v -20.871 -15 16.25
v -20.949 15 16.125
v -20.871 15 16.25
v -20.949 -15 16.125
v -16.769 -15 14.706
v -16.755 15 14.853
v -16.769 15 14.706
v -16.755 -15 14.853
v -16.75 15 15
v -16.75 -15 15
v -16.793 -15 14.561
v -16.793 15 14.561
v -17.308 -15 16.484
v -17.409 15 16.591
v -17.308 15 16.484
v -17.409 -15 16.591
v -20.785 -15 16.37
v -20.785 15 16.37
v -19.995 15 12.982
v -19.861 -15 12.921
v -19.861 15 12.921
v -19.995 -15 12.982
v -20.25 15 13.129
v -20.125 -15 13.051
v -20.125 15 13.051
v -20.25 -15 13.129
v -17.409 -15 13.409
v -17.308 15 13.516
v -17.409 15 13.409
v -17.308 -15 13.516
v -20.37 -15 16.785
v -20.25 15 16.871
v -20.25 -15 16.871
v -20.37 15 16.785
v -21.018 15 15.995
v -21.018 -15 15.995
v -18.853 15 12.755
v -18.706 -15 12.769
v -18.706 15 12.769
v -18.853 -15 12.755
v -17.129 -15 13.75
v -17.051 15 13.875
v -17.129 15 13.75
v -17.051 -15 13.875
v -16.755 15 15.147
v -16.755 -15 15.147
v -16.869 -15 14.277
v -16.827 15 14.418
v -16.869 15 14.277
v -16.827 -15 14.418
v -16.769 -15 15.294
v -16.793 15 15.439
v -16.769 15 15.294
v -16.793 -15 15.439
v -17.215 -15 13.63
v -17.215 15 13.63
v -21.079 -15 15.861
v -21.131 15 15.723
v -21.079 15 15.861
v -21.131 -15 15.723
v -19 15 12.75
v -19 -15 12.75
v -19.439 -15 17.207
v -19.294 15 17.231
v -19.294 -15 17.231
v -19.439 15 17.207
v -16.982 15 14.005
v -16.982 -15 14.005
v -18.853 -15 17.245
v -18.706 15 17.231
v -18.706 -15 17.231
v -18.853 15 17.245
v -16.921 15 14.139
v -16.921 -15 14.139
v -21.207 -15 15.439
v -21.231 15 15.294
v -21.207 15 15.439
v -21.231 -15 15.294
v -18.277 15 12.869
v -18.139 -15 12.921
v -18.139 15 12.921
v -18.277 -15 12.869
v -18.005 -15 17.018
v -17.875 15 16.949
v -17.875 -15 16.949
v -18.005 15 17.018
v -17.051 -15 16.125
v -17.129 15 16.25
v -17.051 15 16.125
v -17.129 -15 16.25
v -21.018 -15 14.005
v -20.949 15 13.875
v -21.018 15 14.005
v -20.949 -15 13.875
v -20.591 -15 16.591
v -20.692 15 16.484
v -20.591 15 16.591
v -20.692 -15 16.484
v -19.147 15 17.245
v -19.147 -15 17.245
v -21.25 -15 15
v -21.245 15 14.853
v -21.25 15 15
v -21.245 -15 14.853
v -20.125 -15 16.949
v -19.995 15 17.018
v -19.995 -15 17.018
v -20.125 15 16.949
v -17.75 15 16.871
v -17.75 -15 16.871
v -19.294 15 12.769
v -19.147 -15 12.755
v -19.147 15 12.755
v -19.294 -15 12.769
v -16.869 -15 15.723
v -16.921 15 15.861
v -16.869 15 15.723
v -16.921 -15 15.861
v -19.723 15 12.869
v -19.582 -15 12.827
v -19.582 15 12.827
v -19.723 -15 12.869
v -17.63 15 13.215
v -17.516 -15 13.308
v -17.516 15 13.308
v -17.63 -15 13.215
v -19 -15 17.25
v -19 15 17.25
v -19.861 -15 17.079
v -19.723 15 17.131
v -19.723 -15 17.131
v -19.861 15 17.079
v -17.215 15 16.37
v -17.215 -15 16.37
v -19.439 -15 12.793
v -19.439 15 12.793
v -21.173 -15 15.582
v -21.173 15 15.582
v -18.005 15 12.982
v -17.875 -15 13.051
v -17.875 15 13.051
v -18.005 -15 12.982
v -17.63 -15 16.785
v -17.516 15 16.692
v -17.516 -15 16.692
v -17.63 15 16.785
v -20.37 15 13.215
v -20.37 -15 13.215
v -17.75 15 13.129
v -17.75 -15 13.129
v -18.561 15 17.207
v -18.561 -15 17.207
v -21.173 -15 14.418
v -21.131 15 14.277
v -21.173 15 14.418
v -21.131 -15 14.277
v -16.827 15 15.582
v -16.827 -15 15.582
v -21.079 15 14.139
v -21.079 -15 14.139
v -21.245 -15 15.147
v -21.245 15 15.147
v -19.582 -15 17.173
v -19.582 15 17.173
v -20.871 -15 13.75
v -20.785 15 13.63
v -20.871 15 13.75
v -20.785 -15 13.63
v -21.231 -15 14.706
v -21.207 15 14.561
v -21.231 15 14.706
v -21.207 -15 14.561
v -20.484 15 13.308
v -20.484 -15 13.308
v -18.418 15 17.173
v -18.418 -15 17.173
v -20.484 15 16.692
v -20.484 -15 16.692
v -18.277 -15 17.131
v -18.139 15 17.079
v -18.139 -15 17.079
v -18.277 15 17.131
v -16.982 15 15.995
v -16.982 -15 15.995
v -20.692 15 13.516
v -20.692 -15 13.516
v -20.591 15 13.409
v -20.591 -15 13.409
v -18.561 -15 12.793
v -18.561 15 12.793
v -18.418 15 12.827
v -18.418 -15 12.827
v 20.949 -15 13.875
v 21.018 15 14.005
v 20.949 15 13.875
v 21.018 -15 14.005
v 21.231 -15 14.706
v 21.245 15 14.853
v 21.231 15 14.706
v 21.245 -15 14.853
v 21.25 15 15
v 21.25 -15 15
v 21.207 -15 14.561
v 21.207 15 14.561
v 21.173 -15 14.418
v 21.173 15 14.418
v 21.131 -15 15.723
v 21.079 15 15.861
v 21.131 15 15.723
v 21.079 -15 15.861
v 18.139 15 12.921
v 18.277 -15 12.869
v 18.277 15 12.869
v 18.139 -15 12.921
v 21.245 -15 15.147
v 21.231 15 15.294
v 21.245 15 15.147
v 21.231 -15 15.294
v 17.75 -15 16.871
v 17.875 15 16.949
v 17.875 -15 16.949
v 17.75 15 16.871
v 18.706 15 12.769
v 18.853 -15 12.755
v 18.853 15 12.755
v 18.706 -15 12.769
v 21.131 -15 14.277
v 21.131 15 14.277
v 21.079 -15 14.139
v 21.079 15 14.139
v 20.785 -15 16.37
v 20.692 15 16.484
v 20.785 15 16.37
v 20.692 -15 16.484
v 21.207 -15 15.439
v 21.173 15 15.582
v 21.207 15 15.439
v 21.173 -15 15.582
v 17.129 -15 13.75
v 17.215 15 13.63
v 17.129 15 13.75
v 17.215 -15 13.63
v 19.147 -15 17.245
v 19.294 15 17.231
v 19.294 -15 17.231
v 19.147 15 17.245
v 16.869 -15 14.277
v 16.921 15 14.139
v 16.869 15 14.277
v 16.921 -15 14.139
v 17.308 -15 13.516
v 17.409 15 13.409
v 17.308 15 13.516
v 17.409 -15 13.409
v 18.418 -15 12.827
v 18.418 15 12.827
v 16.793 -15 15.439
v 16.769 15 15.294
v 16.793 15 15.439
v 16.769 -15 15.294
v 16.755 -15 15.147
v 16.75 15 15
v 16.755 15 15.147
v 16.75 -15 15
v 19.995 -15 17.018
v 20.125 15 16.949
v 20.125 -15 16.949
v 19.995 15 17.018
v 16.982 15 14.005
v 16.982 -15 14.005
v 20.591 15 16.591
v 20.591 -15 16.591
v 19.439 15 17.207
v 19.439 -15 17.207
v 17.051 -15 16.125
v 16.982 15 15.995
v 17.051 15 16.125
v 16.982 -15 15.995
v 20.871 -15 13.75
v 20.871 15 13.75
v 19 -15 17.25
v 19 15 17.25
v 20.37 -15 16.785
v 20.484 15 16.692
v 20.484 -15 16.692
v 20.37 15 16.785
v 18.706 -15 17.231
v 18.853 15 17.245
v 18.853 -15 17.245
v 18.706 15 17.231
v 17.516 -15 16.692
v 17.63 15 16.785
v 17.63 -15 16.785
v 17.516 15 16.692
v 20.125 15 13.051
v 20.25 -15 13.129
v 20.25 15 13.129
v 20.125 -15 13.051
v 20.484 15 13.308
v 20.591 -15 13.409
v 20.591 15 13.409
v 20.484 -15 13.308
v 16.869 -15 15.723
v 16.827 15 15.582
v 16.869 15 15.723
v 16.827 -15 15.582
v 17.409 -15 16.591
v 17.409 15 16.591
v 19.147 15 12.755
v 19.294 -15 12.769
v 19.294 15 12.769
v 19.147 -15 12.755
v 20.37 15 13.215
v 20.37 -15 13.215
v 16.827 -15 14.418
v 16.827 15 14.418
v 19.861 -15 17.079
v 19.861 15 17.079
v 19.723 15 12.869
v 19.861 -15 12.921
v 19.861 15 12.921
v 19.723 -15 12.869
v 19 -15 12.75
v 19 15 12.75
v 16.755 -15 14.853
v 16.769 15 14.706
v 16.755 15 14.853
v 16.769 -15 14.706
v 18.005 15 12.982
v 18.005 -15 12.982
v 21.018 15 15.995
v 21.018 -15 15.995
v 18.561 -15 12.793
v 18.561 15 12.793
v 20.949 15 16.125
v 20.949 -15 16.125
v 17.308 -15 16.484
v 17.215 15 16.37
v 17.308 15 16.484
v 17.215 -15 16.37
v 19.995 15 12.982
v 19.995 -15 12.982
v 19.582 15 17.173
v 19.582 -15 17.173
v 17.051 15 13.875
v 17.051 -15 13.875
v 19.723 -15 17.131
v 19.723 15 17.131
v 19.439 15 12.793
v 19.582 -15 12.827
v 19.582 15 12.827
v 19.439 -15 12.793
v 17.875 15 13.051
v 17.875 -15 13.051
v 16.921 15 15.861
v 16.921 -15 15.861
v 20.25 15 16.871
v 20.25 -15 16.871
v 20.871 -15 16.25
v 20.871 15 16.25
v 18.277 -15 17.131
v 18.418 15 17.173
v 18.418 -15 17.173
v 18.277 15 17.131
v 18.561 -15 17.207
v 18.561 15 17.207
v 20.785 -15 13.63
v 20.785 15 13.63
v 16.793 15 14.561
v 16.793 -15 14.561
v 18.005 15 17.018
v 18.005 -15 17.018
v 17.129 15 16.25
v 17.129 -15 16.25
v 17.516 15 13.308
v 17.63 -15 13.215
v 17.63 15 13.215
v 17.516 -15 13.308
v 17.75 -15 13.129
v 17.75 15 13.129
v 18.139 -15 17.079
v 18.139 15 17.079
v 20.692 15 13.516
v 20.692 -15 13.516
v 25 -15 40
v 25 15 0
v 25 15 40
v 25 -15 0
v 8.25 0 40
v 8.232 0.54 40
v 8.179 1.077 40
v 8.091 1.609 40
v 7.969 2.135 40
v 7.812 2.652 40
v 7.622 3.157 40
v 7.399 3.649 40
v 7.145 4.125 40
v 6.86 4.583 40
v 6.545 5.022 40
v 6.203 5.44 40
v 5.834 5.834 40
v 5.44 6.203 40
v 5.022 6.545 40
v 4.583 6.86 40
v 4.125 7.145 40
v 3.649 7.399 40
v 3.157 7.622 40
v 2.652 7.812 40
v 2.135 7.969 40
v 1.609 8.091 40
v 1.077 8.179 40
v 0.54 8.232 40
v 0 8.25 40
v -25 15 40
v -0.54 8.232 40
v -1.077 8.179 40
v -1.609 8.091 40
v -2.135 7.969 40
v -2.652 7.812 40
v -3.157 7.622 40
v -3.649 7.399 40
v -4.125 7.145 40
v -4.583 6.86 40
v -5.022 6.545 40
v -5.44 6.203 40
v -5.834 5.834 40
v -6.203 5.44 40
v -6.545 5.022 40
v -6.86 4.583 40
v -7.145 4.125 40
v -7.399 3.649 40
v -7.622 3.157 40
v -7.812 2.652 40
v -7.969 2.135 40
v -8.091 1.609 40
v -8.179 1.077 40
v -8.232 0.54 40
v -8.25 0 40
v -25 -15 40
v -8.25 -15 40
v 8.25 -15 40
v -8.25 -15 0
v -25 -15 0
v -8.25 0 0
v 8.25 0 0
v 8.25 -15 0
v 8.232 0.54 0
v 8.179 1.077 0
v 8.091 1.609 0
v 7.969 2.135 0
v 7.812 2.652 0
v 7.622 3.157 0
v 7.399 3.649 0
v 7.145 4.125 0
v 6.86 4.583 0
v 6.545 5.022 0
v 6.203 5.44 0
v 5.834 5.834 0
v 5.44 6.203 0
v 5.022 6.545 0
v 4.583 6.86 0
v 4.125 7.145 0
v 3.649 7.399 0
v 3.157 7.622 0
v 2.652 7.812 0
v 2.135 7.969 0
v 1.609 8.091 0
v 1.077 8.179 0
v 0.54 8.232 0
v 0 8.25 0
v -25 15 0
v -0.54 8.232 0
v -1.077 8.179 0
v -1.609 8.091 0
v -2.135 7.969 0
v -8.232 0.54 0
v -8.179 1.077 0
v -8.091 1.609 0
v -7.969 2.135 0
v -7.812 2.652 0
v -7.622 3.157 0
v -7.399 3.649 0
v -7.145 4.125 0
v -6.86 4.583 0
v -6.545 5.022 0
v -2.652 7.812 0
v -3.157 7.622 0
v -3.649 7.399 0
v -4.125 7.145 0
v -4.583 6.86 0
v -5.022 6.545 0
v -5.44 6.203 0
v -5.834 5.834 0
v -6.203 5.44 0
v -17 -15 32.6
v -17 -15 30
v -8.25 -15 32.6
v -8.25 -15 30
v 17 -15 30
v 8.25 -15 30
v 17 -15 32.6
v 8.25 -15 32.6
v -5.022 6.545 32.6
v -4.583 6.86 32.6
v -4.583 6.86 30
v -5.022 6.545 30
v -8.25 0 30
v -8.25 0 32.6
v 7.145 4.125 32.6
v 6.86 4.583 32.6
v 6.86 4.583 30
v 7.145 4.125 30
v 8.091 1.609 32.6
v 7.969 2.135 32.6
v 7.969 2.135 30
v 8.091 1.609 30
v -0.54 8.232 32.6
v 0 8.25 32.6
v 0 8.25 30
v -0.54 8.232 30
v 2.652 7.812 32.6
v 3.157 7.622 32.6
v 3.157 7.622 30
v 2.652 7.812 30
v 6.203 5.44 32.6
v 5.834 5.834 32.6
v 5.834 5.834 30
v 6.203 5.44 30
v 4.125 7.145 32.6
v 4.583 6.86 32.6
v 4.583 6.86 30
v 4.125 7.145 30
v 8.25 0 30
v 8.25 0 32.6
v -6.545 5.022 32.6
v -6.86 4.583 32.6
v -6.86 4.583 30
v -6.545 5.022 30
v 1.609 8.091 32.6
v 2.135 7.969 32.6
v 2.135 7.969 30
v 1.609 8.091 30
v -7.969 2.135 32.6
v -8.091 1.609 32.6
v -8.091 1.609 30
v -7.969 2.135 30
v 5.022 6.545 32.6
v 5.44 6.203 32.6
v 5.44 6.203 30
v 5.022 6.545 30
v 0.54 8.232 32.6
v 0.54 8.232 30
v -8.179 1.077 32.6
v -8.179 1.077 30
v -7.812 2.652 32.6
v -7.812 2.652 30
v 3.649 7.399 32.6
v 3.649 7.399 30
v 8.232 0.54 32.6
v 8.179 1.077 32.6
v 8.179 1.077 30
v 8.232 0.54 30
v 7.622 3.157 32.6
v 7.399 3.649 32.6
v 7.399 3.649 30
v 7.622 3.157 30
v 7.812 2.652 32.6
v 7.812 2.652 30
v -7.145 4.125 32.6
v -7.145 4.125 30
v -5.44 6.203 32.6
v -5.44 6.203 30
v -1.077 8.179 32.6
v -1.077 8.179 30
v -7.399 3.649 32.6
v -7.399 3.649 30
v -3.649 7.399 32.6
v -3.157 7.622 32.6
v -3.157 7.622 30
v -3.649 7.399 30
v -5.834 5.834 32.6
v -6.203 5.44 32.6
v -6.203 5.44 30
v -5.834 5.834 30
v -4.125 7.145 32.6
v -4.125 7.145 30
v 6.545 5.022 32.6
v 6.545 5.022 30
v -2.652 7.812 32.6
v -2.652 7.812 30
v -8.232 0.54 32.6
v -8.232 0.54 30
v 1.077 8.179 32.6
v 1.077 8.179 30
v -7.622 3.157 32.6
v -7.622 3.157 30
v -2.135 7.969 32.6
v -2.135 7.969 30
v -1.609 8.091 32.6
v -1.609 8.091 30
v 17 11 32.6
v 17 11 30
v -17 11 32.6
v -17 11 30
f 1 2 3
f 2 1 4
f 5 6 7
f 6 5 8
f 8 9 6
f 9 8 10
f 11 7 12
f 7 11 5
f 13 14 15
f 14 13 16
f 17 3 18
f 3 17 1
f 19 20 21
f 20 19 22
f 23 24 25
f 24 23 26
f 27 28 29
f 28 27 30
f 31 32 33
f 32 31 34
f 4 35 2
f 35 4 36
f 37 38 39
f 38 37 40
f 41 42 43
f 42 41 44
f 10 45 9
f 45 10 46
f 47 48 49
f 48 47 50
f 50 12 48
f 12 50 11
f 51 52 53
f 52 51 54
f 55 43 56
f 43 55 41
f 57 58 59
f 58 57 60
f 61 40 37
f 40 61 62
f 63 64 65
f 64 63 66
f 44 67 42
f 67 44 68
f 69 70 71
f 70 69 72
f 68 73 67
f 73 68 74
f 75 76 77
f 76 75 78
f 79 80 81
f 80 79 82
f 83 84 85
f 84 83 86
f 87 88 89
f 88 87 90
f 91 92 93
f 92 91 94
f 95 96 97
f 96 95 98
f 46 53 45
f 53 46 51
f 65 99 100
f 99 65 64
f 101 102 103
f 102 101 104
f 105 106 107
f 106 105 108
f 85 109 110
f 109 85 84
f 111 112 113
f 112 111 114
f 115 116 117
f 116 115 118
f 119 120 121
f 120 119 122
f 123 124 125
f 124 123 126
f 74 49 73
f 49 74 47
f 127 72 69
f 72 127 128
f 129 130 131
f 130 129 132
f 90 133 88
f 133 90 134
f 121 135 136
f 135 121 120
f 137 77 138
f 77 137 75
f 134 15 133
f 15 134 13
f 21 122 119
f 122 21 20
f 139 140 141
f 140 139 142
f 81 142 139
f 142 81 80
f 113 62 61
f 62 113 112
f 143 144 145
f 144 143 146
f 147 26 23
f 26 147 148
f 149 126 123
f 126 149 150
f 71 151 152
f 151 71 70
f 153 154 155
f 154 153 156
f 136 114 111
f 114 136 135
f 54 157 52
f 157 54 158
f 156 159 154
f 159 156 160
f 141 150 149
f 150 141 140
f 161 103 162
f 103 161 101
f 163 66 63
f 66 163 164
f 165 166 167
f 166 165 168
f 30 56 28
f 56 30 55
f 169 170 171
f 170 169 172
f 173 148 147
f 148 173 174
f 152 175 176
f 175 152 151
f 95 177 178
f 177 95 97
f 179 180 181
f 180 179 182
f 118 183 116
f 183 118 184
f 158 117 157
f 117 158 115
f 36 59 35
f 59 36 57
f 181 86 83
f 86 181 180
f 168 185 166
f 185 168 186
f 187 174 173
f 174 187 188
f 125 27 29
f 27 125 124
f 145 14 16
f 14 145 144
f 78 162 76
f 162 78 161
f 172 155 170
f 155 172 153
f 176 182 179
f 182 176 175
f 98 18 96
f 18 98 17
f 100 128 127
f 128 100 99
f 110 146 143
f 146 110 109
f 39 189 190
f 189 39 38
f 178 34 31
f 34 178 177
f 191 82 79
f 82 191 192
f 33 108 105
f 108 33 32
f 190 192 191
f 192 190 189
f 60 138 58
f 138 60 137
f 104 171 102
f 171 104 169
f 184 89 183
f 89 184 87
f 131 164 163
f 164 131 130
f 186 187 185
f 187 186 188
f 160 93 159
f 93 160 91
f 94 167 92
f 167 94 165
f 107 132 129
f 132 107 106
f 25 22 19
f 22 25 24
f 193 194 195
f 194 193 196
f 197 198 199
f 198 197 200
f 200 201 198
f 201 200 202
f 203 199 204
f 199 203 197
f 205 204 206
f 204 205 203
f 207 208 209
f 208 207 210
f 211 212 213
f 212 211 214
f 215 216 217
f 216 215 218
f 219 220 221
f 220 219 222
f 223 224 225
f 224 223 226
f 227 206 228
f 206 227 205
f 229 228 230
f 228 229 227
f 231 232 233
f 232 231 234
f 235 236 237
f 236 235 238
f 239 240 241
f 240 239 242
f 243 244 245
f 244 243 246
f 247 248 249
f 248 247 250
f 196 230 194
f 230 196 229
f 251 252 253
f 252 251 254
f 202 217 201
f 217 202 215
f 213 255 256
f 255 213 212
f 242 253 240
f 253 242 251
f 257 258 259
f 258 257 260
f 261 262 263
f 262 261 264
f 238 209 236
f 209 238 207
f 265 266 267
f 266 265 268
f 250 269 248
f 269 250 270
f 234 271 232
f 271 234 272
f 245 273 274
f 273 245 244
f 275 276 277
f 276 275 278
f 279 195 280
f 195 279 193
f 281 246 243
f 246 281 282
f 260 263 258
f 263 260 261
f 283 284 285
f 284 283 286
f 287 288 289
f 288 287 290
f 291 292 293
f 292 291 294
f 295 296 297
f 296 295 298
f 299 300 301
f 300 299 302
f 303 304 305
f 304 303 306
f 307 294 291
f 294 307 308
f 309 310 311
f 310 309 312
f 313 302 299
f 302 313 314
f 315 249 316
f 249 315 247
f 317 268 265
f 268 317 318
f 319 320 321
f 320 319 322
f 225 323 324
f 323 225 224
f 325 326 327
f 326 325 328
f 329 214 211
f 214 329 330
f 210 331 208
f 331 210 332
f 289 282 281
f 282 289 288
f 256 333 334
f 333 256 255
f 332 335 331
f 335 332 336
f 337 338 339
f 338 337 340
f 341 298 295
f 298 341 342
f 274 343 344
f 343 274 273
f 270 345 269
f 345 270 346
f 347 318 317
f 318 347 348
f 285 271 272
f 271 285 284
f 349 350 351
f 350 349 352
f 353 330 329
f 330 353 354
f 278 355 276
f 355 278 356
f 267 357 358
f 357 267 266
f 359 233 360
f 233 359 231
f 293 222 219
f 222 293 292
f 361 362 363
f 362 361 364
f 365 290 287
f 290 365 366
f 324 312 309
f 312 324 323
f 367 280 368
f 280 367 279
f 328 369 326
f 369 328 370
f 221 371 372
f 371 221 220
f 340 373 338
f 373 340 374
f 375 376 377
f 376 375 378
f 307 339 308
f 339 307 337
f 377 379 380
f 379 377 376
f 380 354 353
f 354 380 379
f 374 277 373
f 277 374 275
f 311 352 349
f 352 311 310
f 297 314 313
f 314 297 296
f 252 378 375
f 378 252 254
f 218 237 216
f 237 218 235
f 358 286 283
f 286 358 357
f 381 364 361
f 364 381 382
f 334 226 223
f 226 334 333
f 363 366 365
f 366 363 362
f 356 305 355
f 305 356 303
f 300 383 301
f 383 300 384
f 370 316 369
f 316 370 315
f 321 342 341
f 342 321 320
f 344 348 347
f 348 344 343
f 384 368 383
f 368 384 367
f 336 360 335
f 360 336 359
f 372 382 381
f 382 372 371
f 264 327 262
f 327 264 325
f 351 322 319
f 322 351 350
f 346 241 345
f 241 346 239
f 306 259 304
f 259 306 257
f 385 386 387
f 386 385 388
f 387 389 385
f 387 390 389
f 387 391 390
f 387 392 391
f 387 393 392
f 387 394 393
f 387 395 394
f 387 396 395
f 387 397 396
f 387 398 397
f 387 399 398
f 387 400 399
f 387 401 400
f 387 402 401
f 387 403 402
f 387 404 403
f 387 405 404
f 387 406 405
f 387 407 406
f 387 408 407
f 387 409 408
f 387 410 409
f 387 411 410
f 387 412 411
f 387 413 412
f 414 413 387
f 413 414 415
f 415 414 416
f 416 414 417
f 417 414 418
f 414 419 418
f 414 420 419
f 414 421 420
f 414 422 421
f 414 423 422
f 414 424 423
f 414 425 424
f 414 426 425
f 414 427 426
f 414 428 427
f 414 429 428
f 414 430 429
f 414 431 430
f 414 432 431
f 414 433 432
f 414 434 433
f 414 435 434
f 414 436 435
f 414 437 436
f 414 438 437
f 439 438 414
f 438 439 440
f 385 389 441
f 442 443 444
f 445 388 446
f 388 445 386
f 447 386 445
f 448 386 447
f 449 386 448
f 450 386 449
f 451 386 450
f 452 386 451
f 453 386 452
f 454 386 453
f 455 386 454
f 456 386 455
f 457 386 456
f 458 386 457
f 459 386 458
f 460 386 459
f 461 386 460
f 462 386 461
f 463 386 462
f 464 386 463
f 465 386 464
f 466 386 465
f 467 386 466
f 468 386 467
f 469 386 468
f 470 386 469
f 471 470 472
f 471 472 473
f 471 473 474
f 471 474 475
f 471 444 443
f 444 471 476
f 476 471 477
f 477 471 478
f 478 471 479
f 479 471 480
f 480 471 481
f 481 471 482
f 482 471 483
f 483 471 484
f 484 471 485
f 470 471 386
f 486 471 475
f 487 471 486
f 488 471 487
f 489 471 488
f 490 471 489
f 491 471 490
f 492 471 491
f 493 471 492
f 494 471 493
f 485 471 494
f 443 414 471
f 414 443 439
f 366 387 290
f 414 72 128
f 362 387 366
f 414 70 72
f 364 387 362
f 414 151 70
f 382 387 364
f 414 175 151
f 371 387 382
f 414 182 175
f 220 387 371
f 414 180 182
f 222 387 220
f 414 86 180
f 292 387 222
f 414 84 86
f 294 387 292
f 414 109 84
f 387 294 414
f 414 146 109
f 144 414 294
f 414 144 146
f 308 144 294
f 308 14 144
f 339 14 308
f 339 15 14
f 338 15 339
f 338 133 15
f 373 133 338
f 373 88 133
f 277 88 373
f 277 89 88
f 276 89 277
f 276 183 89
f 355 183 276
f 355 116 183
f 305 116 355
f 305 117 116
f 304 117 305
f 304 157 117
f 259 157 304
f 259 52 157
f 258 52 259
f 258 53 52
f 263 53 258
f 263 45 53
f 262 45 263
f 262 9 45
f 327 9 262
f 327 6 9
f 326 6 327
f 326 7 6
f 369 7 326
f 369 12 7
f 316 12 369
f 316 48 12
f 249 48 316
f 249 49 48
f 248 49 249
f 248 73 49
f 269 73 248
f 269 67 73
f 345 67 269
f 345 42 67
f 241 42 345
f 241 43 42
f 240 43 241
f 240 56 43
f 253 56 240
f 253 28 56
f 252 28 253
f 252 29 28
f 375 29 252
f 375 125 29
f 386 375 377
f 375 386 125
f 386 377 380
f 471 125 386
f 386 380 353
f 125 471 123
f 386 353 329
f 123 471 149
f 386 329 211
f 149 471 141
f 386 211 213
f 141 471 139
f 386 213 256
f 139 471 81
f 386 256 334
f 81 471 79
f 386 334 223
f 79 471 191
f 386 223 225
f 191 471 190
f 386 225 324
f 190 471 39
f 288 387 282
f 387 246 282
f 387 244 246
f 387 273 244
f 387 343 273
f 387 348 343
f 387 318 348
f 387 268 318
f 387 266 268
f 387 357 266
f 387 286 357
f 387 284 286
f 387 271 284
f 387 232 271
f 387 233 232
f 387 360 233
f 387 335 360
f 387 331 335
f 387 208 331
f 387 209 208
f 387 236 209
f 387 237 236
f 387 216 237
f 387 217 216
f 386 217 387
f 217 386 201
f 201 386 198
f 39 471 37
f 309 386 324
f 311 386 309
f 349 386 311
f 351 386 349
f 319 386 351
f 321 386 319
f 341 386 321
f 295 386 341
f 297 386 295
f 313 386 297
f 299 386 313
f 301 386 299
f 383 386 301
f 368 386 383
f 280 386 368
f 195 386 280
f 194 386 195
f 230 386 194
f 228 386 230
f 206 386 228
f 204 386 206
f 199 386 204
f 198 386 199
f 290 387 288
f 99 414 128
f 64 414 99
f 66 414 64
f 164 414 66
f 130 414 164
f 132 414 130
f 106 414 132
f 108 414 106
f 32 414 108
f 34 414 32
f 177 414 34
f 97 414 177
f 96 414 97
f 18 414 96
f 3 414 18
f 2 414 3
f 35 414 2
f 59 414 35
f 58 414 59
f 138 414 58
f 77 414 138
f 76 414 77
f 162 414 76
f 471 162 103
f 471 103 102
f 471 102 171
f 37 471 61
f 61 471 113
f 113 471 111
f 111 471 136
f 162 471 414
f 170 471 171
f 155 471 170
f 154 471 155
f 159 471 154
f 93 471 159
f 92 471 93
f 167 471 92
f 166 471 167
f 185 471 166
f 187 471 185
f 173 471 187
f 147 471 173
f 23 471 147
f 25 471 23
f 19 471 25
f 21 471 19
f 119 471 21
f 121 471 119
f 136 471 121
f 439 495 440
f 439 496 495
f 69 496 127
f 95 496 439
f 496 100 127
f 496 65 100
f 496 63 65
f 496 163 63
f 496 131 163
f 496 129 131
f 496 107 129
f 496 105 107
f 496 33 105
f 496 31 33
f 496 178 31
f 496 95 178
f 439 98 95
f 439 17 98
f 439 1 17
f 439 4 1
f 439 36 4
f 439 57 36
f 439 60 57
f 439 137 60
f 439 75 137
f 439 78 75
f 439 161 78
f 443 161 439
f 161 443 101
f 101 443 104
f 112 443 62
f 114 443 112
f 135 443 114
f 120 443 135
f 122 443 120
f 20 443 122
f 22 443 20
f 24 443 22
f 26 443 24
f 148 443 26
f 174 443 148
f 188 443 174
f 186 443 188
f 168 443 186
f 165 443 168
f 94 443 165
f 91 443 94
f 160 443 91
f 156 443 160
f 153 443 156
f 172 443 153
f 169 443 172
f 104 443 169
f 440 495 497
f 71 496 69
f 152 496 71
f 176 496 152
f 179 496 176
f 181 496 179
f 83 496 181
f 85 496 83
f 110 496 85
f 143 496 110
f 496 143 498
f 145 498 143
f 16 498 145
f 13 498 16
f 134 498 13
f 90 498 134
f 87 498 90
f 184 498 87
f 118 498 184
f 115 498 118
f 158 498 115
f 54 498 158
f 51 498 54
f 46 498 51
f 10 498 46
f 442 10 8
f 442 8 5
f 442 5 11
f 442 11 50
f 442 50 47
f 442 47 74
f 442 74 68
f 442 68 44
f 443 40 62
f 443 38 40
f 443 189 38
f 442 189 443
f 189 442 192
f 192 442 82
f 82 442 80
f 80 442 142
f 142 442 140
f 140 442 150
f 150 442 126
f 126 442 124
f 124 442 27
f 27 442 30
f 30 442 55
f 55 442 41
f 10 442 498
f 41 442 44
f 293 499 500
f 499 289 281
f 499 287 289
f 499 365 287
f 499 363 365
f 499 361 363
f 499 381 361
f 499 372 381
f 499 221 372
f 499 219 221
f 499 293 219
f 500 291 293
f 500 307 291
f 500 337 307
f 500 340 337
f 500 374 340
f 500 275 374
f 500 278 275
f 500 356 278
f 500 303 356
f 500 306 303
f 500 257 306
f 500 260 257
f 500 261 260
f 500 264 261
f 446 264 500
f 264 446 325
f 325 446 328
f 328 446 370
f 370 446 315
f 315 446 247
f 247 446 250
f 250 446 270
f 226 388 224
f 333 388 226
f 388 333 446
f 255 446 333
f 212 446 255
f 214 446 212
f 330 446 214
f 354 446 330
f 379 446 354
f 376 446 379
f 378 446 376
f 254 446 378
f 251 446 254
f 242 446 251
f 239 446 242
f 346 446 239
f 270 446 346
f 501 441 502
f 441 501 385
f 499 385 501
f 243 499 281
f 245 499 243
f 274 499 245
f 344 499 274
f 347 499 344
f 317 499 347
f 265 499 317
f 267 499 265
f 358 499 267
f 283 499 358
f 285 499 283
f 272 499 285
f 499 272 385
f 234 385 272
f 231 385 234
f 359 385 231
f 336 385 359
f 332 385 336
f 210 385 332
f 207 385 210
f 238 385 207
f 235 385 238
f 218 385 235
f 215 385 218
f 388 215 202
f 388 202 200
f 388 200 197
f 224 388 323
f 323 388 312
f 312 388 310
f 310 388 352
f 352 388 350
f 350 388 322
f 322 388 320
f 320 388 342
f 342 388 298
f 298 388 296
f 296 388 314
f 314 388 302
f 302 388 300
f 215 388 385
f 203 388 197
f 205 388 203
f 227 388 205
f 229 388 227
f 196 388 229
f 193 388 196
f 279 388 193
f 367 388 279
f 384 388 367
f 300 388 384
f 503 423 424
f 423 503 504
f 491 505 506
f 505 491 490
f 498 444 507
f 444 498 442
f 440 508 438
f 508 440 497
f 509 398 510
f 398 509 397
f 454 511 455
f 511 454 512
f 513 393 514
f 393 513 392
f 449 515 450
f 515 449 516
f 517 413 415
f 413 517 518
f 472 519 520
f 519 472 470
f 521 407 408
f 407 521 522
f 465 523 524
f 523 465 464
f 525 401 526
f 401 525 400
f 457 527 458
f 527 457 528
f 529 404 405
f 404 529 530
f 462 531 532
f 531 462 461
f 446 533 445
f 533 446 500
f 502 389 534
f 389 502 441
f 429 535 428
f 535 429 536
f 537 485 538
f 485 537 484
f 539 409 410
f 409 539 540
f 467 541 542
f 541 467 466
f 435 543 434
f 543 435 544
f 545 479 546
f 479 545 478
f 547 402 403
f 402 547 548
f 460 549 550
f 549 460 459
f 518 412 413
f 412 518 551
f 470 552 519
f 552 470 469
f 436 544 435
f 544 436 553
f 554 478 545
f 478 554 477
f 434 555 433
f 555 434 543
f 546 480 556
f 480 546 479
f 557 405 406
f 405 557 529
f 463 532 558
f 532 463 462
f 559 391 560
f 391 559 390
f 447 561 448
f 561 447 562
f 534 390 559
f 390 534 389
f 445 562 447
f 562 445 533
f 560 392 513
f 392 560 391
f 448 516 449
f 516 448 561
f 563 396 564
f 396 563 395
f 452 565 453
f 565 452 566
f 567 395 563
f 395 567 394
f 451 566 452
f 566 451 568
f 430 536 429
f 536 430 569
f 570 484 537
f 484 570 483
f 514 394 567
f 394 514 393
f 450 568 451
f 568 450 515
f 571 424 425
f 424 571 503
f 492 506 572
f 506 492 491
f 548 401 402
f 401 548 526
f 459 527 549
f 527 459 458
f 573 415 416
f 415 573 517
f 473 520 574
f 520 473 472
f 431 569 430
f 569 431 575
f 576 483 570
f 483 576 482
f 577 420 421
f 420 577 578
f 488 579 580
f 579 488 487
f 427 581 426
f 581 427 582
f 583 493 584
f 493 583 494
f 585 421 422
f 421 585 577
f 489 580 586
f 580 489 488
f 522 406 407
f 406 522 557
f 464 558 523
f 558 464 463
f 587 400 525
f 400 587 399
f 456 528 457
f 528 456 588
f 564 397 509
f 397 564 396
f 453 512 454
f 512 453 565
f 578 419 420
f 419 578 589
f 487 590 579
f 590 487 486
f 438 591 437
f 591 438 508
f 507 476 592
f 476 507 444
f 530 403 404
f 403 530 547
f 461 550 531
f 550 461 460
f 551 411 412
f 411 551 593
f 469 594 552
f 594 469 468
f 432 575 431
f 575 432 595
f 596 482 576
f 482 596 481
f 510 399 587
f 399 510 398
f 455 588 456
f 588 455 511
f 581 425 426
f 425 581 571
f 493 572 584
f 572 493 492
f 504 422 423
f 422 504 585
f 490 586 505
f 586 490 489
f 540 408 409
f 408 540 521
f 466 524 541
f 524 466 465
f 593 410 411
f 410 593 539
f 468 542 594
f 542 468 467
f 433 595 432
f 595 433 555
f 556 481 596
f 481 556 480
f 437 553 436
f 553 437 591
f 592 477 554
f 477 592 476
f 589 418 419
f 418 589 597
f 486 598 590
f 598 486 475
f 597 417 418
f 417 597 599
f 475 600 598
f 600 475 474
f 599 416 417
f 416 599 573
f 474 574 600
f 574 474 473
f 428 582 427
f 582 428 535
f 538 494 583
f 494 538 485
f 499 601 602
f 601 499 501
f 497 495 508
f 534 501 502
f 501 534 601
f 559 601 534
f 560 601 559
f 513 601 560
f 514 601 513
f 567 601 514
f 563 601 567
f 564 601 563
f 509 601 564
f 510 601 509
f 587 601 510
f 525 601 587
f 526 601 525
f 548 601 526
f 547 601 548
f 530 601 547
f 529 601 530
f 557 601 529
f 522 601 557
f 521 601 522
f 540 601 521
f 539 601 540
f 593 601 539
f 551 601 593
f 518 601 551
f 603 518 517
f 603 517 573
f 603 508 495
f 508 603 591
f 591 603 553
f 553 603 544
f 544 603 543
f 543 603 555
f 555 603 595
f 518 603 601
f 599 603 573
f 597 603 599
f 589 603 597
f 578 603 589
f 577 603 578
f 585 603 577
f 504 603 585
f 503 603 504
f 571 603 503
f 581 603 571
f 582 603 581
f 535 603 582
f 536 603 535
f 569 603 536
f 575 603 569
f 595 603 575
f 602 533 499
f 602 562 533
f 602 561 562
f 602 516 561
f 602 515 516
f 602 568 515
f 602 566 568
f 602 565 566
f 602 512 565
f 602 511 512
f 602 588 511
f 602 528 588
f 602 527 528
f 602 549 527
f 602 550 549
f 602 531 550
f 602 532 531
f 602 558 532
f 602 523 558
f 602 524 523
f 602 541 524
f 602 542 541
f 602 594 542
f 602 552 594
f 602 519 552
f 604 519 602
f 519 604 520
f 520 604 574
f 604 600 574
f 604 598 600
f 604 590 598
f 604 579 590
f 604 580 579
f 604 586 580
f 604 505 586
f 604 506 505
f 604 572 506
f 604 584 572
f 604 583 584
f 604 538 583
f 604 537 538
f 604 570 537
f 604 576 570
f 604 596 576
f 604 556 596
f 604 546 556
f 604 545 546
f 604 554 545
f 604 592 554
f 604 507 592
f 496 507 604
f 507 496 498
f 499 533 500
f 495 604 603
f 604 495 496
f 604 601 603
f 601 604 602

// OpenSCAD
// Wall-mounted holder for a 10 mL syringe (hangs tip-down)
// Printed as used: standing on bed, back face (y = +15) goes against the wall

$fn = 96;

// ---------------- Block ----------------
block_w = 50;      // X width
block_d = 30;      // Y depth
block_h = 40;      // Z height

// ---------------- Barrel channel ----------------
chan_w   = 16.5;          // channel width (X)
chan_r   = chan_w / 2;    // 8.25 mm radius of rear half-circle
chan_cy  = 0;             // Y of half-circle centre

// ---------------- Flange slot ----------------
slot_w      = 34;     // X width, centred
slot_z0     = 30;     // bottom of slot
slot_h      = 2.6;    // slot height (z = 30 to 32.6)
slot_back_y = 11;     // slot cut from front face back to this Y

// ---------------- Screw holes ----------------
screw_d  = 4.5;           // M4 clearance hole
screw_x  = [-19, 19];     // X positions
screw_z  = 15;            // Z height

// ---------------- Misc ----------------
eps = 0.5;   // overshoot for clean cuts

front_y = -block_d / 2;   // -15
back_y  =  block_d / 2;   // +15

difference() {
    // Main block
    translate([-block_w / 2, front_y, 0])
        cube([block_w, block_d, block_h]);

    // Barrel channel: half-circle at back, straight sides out to the front face
    translate([0, 0, -eps])
        linear_extrude(height = block_h + 2 * eps)
            hull() {
                translate([0, chan_cy]) circle(r = chan_r);
                translate([-chan_r, front_y - eps])
                    square([chan_w, chan_cy - (front_y - eps)]);
            }

    // Flange slot: from front face back to y = 11
    translate([-slot_w / 2, front_y - eps, slot_z0])
        cube([slot_w, (slot_back_y - front_y) + eps, slot_h]);

    // M4 wall-screw holes, front to back along Y
    for (x = screw_x)
        translate([x, front_y - eps, screw_z])
            rotate([-90, 0, 0])
                cylinder(d = screw_d, h = block_d + 2 * eps);
}
